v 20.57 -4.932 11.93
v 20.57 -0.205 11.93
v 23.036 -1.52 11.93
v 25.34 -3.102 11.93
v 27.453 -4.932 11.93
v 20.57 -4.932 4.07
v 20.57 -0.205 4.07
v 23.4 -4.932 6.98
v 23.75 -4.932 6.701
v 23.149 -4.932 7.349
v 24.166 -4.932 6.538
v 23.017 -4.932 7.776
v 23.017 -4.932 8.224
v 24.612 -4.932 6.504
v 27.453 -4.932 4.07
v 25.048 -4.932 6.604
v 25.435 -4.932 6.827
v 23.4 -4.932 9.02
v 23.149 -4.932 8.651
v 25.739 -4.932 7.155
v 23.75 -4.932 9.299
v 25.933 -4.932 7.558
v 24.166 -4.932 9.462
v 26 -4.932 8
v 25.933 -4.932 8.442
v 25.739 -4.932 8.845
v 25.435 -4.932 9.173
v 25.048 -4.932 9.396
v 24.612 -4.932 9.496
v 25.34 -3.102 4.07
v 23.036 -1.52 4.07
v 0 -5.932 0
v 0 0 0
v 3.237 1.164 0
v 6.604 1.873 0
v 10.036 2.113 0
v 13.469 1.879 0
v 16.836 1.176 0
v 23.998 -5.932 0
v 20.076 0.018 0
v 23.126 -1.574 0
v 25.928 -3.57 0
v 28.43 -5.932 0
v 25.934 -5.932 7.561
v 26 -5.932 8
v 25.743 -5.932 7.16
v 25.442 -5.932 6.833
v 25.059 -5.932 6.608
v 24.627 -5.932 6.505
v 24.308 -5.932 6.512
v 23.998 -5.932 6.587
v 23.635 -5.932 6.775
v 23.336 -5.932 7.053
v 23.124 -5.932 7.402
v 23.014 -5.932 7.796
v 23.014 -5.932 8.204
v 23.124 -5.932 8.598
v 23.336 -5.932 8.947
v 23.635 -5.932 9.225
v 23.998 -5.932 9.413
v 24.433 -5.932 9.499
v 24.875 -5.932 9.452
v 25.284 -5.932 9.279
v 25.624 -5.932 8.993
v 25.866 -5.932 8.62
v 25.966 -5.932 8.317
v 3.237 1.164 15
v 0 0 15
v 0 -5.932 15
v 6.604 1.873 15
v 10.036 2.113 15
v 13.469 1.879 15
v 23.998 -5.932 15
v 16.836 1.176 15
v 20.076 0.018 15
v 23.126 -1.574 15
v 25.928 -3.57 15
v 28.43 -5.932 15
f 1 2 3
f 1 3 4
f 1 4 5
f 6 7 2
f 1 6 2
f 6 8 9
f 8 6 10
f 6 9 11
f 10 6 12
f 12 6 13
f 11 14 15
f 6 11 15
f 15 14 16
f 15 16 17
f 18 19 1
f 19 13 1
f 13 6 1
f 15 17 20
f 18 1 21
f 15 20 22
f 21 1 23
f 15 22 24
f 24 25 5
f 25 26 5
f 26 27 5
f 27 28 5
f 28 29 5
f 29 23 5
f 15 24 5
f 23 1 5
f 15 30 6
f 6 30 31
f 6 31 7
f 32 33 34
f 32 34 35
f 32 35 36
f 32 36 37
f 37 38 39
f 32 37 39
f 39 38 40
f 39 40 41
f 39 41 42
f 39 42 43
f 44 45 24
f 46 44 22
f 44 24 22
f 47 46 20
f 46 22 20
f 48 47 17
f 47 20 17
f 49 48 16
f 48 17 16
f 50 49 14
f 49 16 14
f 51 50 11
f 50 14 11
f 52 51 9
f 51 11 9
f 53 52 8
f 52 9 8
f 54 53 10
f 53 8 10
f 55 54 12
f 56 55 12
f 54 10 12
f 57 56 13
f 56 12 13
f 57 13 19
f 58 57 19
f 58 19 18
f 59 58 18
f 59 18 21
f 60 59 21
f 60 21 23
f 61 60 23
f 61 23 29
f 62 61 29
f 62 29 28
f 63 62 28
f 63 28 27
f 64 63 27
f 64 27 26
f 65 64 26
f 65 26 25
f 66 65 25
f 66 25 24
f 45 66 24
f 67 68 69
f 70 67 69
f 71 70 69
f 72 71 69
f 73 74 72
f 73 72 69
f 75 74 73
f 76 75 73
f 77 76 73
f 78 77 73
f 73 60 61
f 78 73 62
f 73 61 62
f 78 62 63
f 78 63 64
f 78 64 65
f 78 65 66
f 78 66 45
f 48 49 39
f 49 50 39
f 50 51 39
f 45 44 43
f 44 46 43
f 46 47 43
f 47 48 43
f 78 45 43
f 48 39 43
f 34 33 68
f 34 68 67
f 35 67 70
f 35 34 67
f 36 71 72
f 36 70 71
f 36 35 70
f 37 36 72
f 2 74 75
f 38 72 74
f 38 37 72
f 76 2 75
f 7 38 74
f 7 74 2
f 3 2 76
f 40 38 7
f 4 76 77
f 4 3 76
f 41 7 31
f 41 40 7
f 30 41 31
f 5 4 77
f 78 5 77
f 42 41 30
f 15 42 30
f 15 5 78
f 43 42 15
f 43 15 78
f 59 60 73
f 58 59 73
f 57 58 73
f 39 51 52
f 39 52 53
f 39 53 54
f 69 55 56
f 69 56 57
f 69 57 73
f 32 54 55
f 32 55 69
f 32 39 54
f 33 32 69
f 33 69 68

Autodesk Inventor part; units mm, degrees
ref_plane "YZ Plane" through (0, 0, 0) normal (1, 0, 0) x (0, 1, 0)
ref_plane "XZ Plane" through (0, 0, 0) normal (0, 1, 0) x (-1, 0, 0)
sketch "Эскиз1" plane through (0, 0, 0) normal (0, 0, 1) x (1, 0, 0)
  arc A0 (28.4298, -5.9319) -> (0, 0) centre (10.0583, -22.8873) ccw
  line L0 (0, -5.9315) -> (0, 0)
  line L1 (23.9975, -5.9315) -> (0, -5.9315)
  line L2 (23.9975, -5.9315) -> (23.998, -5.9315)
  line L3 (23.998, -5.9319) -> (23.998, -5.9315)
  line L4 (23.998, -5.9319) -> (28.4298, -5.9319)
  point P0 (0, 0)
  point P1 (-10.0583, 22.8873)
extrude "Выдавливание1" add sketch "Эскиз1" along normal blind 15
ref_plane "РабПлоскость1" through (10.0583, 2.1127, 0) normal (0, -1, 0) x (1, 0, 0)
sketch "Эскиз2" plane through (10.0583, 2.1127, 0) normal (0, -1, 0) x (1, 0, 0)
  circle A0 centre (14.4417, 8) radius 1.5 projected
  line L0 (18.3715, 0) -> (18.3715, 15) projected
  line L1 (10.5118, 11.93) -> (18.3715, 11.93)
  line L2 (18.3715, 11.93) -> (18.3715, 4.07)
  line L3 (18.3715, 4.07) -> (10.5118, 4.07)
  line L4 (10.5118, 4.07) -> (10.5118, 11.93)
  line L5 (10.5118, 11.93) -> (18.3715, 4.07) construction
  line L6 (18.3715, 11.93) -> (10.5118, 4.07) construction
  point P0 (-10.0583, 0)
  dimension "d2" = 7.86
extrude "Выдавливание2" cut sketch "Эскиз2" along normal blind 10.2942 contours A0
sketch "Эскиз3" plane through (10.0583, 2.1127, 0) normal (0, -1, 0) x (1, 0, 0)
  circle A0 centre (14.4417, 8) radius 1.5
  line L0 (18.3715, 0) -> (18.3715, 15)
  line L1 (10.5118, 11.93) -> (18.3715, 11.93)
  line L2 (18.3715, 11.93) -> (18.3715, 4.07)
  line L3 (18.3715, 4.07) -> (10.5118, 4.07)
  line L4 (10.5118, 4.07) -> (10.5118, 11.93)
  line L5 (10.5118, 11.93) -> (18.3715, 4.07) construction
  line L6 (18.3715, 11.93) -> (10.5118, 4.07) construction
  point P0 (-10.0583, 0)
  point P1 (-10.0583, 0)
  dimension "d5" = 7.86
extrude "Выдавливание3" cut sketch "Эскиз3" along normal blind 7.0442
properties part number "KB33-046-002-006 - Заглушка"
